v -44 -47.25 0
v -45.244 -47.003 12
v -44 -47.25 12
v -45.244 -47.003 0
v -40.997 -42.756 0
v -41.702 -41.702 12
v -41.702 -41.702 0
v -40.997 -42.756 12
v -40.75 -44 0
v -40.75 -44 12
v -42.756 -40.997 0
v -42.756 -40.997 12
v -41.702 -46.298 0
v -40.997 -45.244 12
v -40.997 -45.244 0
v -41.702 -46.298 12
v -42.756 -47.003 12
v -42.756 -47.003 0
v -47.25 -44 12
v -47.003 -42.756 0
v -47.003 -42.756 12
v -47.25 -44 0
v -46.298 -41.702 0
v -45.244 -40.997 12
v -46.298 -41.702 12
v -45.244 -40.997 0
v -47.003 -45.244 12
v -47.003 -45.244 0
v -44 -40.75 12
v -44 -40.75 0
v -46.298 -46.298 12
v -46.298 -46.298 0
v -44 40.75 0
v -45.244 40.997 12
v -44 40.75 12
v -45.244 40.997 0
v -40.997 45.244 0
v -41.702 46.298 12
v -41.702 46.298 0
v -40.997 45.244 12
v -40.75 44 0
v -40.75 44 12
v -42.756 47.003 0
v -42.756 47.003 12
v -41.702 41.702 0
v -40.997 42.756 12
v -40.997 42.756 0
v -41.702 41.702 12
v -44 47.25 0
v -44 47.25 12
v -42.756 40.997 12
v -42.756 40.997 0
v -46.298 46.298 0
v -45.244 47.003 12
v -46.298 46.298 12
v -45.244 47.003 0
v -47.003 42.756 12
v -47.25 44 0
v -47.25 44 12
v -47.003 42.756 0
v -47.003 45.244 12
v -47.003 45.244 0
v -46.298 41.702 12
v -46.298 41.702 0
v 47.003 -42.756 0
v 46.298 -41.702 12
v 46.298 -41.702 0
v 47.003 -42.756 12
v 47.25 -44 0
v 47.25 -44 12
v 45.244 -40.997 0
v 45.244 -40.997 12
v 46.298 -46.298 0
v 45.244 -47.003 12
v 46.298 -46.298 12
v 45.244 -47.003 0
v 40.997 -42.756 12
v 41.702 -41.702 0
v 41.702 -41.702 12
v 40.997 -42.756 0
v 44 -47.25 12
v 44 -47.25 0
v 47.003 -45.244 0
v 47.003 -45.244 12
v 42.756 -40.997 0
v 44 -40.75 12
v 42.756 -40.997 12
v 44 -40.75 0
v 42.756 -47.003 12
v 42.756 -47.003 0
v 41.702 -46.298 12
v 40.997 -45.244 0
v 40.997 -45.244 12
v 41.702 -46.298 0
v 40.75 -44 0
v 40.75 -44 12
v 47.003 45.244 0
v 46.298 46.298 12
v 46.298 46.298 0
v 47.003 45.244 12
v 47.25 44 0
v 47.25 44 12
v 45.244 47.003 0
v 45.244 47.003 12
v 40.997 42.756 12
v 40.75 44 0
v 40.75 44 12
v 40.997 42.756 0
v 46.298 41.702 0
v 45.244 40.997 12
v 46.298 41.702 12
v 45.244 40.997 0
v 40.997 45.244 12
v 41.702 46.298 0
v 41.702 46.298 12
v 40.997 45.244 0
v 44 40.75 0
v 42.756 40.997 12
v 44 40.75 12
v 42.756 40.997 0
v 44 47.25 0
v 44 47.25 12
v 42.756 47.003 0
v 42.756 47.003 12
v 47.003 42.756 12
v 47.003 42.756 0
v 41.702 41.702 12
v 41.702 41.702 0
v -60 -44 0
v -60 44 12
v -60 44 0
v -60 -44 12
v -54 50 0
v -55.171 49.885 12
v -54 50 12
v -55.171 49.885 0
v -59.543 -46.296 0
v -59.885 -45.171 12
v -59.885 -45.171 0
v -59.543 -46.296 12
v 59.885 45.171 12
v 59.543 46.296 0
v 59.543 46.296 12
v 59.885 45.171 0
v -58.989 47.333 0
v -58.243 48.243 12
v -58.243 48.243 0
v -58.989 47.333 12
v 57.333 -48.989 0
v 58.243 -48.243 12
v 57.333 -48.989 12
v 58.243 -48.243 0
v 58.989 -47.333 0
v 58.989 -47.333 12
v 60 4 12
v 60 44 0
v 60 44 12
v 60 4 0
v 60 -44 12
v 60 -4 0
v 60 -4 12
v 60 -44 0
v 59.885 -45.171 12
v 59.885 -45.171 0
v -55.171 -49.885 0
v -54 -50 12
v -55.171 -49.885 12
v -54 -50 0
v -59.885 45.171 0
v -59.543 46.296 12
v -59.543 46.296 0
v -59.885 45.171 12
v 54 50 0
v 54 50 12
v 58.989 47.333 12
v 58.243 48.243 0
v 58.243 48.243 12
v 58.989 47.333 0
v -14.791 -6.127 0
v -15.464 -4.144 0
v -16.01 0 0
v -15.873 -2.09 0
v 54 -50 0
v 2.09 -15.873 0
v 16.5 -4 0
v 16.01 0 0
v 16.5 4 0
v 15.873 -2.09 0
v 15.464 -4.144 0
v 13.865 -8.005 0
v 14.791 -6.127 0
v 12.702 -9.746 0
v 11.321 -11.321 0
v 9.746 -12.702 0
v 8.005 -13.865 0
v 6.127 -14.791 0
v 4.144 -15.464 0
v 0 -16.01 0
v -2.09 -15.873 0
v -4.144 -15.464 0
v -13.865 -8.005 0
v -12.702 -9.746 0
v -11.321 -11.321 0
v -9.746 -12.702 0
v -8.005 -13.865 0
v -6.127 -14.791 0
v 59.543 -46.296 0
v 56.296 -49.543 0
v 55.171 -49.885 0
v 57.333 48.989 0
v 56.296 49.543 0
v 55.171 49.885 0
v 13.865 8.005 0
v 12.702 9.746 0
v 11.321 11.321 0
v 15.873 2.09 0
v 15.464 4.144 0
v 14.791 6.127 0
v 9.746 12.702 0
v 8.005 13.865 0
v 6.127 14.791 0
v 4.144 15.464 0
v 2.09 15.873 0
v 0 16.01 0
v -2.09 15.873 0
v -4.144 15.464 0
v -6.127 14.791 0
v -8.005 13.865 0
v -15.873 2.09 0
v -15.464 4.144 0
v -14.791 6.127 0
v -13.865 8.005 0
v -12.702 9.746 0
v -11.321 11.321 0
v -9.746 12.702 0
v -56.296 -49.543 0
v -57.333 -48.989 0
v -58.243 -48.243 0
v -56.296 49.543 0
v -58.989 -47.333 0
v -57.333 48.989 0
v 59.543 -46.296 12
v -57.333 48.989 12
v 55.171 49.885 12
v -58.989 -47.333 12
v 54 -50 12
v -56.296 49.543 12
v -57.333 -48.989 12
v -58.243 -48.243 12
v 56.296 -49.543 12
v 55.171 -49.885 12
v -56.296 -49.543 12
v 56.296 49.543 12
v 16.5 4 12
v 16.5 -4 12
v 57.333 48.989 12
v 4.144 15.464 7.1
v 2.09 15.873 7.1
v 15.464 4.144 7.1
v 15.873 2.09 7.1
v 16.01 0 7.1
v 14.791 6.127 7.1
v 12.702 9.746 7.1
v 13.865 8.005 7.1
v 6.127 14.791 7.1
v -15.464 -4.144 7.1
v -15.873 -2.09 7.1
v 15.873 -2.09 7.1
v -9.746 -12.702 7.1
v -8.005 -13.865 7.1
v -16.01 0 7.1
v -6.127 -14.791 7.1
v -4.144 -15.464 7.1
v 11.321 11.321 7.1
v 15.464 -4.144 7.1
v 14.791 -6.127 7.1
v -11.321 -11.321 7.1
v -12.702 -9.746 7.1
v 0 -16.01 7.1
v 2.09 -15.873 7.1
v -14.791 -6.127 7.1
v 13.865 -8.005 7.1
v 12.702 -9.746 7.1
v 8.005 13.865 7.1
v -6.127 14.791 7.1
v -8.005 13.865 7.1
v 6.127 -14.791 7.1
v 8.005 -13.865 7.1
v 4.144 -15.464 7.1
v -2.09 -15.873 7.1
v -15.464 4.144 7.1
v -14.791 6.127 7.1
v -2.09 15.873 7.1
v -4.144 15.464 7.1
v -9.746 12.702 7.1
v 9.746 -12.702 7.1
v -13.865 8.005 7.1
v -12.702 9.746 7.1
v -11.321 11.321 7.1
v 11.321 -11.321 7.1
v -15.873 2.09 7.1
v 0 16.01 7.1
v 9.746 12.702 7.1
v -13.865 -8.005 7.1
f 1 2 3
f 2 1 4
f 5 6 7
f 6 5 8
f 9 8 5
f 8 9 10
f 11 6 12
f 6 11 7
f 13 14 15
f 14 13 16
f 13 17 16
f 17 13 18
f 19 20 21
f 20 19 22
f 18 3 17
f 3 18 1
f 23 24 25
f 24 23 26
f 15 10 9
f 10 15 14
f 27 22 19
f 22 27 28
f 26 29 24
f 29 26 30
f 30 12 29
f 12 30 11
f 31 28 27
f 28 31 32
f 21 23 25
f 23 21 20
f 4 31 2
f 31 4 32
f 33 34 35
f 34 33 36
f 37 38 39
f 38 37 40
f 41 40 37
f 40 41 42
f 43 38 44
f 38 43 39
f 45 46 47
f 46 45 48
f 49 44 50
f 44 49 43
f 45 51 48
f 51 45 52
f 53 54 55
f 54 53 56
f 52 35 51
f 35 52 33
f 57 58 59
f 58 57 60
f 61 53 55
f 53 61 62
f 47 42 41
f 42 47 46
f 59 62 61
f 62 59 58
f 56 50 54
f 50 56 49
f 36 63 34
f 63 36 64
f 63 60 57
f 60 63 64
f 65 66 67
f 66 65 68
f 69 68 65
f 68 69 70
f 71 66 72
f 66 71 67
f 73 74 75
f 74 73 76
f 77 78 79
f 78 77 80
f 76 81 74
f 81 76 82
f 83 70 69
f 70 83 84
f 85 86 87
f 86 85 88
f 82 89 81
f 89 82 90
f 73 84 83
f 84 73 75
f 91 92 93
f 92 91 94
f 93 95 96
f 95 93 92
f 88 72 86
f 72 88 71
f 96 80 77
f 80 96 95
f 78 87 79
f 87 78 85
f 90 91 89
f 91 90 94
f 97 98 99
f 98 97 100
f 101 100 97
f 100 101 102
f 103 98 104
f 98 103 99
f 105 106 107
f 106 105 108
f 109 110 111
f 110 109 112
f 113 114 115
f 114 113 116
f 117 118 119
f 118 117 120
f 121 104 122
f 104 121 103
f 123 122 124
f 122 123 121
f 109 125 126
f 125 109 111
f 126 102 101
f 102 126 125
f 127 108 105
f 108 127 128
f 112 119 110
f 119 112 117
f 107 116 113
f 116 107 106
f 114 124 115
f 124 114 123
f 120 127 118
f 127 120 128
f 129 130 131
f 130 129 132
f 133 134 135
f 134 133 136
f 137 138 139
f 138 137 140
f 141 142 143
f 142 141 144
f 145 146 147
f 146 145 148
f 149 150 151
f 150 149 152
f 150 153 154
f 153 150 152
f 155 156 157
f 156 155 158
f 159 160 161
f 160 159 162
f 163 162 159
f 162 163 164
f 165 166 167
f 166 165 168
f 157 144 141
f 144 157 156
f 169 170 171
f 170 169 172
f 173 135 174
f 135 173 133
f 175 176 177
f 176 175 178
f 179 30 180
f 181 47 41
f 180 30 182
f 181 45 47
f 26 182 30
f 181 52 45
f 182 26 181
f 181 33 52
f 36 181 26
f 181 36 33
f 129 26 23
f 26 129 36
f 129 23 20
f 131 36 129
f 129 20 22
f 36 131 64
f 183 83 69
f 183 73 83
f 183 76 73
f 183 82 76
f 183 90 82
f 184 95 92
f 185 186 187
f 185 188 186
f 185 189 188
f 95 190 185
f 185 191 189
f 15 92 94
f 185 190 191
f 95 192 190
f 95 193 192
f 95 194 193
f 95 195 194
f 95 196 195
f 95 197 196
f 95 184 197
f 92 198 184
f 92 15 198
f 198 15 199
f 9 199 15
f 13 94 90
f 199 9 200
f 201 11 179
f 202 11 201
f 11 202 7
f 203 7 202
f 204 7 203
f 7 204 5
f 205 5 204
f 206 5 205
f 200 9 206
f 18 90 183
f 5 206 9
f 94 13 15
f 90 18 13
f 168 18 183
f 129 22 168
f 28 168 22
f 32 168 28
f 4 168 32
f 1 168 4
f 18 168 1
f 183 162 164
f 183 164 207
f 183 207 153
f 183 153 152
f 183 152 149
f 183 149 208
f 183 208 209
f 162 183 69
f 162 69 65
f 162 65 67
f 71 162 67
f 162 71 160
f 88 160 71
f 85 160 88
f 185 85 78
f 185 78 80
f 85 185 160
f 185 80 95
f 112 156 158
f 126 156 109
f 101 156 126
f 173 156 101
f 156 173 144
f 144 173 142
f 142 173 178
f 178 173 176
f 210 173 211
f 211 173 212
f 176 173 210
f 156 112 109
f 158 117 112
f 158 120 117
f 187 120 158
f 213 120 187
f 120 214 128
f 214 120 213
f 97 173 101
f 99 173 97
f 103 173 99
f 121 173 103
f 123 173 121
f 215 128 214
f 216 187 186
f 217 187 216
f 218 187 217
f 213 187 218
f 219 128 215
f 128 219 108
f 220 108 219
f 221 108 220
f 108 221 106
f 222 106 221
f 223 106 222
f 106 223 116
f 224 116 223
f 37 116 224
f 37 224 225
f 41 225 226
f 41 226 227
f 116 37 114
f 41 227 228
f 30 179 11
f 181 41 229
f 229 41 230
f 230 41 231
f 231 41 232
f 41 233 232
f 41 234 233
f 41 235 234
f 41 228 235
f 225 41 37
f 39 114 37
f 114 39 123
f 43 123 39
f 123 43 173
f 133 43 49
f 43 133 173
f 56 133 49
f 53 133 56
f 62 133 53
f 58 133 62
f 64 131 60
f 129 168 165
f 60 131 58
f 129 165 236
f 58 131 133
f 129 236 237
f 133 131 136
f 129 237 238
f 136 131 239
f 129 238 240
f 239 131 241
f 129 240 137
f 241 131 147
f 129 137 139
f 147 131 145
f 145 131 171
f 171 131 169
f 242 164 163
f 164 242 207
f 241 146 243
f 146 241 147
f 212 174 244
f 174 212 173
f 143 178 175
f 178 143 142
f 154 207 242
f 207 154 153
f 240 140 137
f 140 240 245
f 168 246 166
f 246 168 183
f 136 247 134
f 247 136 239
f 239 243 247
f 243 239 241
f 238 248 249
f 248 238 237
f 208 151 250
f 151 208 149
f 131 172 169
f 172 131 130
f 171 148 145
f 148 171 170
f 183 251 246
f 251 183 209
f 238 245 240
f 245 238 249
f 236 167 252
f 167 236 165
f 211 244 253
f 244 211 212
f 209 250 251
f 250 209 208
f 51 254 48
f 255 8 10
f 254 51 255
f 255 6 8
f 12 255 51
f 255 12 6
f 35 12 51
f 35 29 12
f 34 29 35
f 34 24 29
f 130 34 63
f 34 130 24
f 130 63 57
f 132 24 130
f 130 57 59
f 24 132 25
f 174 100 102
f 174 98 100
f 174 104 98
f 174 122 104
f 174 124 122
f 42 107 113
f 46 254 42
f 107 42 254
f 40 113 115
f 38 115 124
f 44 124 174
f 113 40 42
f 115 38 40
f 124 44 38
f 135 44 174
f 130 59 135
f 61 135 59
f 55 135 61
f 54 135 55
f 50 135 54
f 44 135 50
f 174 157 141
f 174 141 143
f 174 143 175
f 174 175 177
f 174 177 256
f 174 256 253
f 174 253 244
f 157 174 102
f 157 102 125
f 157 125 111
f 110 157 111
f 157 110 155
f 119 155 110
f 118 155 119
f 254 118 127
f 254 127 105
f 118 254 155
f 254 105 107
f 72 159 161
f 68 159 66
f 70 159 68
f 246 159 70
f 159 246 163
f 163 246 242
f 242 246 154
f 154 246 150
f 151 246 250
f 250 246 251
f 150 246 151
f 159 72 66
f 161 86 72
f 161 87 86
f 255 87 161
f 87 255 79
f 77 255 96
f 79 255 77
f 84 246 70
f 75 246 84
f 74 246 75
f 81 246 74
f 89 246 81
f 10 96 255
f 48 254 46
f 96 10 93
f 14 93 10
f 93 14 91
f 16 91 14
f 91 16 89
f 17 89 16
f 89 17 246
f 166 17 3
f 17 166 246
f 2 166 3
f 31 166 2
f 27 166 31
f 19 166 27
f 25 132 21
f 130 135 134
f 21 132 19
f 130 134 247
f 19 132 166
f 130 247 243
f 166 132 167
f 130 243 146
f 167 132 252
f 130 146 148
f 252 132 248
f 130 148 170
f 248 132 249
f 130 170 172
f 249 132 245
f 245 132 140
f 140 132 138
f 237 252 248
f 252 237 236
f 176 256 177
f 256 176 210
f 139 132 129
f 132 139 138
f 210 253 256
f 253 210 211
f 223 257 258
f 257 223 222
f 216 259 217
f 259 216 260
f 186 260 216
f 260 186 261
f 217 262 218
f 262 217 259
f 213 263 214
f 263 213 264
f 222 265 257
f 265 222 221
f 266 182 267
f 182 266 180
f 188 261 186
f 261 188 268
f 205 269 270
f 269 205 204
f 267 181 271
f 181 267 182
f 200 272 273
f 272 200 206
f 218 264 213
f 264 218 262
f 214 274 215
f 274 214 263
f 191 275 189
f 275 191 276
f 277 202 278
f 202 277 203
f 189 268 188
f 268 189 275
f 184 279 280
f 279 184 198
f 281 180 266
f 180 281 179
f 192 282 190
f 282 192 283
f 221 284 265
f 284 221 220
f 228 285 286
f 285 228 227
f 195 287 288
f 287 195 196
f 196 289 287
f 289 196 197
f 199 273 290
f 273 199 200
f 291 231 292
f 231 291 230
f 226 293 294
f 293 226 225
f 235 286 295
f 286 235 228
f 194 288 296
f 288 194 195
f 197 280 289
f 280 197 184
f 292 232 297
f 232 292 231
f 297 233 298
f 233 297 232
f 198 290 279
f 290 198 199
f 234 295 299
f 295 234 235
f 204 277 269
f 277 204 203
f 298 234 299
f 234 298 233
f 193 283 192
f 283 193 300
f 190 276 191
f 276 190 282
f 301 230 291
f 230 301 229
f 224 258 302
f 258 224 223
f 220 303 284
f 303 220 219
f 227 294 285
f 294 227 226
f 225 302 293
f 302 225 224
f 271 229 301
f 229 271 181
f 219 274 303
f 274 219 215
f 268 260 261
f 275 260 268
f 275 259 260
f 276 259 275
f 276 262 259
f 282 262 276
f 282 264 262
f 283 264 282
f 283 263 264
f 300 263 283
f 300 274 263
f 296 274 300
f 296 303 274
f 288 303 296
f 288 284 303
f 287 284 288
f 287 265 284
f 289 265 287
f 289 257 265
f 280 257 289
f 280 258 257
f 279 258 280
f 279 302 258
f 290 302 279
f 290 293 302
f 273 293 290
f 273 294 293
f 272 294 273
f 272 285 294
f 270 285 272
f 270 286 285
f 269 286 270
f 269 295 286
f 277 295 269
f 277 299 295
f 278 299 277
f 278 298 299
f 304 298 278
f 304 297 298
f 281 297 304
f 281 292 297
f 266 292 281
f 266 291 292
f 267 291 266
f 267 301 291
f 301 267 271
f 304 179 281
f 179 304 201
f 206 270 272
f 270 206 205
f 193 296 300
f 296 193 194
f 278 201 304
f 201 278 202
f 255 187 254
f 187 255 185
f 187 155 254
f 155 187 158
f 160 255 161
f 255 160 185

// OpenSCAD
// ===========================================================================
// HULL-FRAME COORDINATE STANDARD - Rev R1 (2026-06-11).  See CLAUDE.md.
//   Hull frame (canonical for ALL design artifacts): X = +port (left),
//   Y = +aft (back), Z = +dorsal (up); origin = SerenityAssembly.FCStd
//   world origin.  Primary-component STLs published to airframe/stls/
//   are stored directly in hull frame, baked by tools/bake_hull_frame.py
//   (marker 'SerenityUAV HULL-FRAME R1' in the binary STL header).
//   NEVER re-bake a mesh derived from an already-baked file.
//   This file:
//     Malcolm ground-support equipment - part-local print frame.  The
//     aircraft hull-frame standard does not apply to GCS hardware
//     (documented exception, like the avionics KiCad files).
// ===========================================================================
/*
 * malcolm_gimbal_pan.scad
 * Pan (azimuth) stage for Malcolm GCS directional antenna gimbal
 *
 * Author:  Steve Griffing, PE(CSE), CISSP-ISSEP, CPP
 * License: CC BY 4.0 — creativecommons.org/licenses/by/4.0
 * Revision: R (2026-06-11)
 *
 * Description:
 *   The pan stage rotates the tilt stage + antenna assembly about the vertical
 *   (Z) axis.  It consists of:
 *     - Base plate that mounts to the tripod or mast (M6 bolt pattern)
 *     - 6804 (20×32×7 mm) thin-section bearing pressed into base
 *     - Rotating turret that carries the tilt stage
 *     - DS3218MG servo mounted in the base, driving the turret via a printed
 *       sector gear attached to the turret underside
 *     - AS5600 magnetic encoder PCB pocket on the underside of the turret
 *       (reads the diametrically magnetised disc pressed onto the bearing shaft)
 *     - Travel limits: 0°–355° continuous (5° hard stop gap for wiring relief)
 *
 * Material: CF-PETG, 0.15 mm layers, 40% infill, 4 perimeters
 *
 * Mesh verification: run after every geometry change.
 *   openscad -o malcolm_gimbal_pan.stl malcolm_gimbal_pan.scad
 *   python3 tools/validate_stls.py
 */

/* ---------------------------------------------------------------------------
 * Render mode: 0 = base plate, 1 = rotating turret, 2 = exploded assembly
 * ---------------------------------------------------------------------------*/
RENDER_MODE = 0;

/* ---------------------------------------------------------------------------
 * Bearing (6804 thin-section: 20 mm ID, 32 mm OD, 7 mm width)
 * ---------------------------------------------------------------------------*/
BRG_ID   = 20.0;   /* Inner race bore mm                                  */
BRG_OD   = 32.0;   /* Outer race diameter mm                              */
BRG_W    = 7.0;    /* Bearing width mm                                    */
BRG_PRESS_TOL = 0.02; /* Press-fit interference on housing bore (+ = tighter) */

/* ---------------------------------------------------------------------------
 * Base plate geometry
 * ---------------------------------------------------------------------------*/
BASE_W   = 120.0;  /* Base plate width mm                                  */
BASE_D   = 100.0;  /* Base plate depth mm                                  */
BASE_H   = 12.0;   /* Base plate thickness mm (including bearing housing)  */
BASE_R   = 6.0;    /* Corner radius mm                                     */
MOUNT_HOLE_D = 6.5;/* M6 tripod mount hole diameter mm                    */
MOUNT_PITCH  = 88.0;/* M6 mounting hole pitch (centre-to-centre) mm       */

/* ---------------------------------------------------------------------------
 * Servo pocket (DS3218MG: 40×20×38 mm body; shaft centre at 20×10 mm from
 * mounting face)
 * ---------------------------------------------------------------------------*/
SERVO_W      = 42.0;   /* Pocket width mm (2 mm clearance each side)      */
SERVO_D      = 22.0;   /* Pocket depth mm                                  */
SERVO_H      = 40.0;   /* Pocket depth below base top face mm              */
SERVO_OFFSET_X = 30.0; /* Servo shaft centre offset from bearing centre X mm */

/* ---------------------------------------------------------------------------
 * Sector gear on turret (M=1.0, R=28 mm, 120° arc driven by servo arm pinion)
 * ---------------------------------------------------------------------------*/
SECTOR_R    = 28.0; /* Pitch radius mm                                     */
SECTOR_ARC  = 120;  /* Sweep angle deg — servo ±60° gives 120° pan range  */
SECTOR_W    = 8.0;  /* Gear face width mm                                  */

/* ---------------------------------------------------------------------------
 * Turret geometry
 * ---------------------------------------------------------------------------*/
TURRET_OD   = 80.0; /* Turret outer diameter mm                            */
TURRET_H    = 15.0; /* Turret body height mm                               */
TILT_MOUNT_W = 60.0;/* Width of tilt stage mounting boss on turret top mm  */
TILT_MOUNT_D = 40.0;/* Depth of tilt stage mounting boss mm                */
TILT_MOUNT_H = 6.0; /* Boss protrusion height mm                           */

/* ===========================================================================
 * Modules
 * ===========================================================================*/

module base_plate() {
    /*
     * Base plate with:
     *   - Central bearing housing (outer race press-fit bore)
     *   - Servo pocket
     *   - M6 tripod mounting holes at four corners
     *   - M3 mounting holes for AS5600 encoder PCB on underside
     */
    difference() {
        /* Exterior solid */
        hull() {
            for (xi = [-1, 1]) {
                for (yi = [-1, 1]) {
                    translate([xi * (BASE_W / 2 - BASE_R), yi * (BASE_D / 2 - BASE_R), 0]) {
                        cylinder(r = BASE_R, h = BASE_H, $fn = 32);
                    }
                }
            }
        }

        /* Central bearing housing bore (outer race press-fit) */
        translate([0, 0, -0.1]) {
            cylinder(d = BRG_OD + BRG_PRESS_TOL, h = BRG_W + 0.2, $fn = 48);
        }

        /* Servo pocket */
        translate([SERVO_OFFSET_X, 0, BASE_H - SERVO_H]) {
            cube([SERVO_W, SERVO_D, SERVO_H + 0.1], center = true);
        }

        /* M6 tripod mount holes */
        for (xi = [-1, 1]) {
            for (yi = [-1, 1]) {
                translate([xi * MOUNT_PITCH / 2, yi * MOUNT_PITCH / 2, -0.1]) {
                    cylinder(d = MOUNT_HOLE_D, h = BASE_H + 0.2, $fn = 16);
                }
            }
        }

        /* Wire relief slot from servo pocket to exterior */
        translate([SERVO_OFFSET_X + SERVO_W / 2, 0, BASE_H / 2]) {
            cube([BASE_W - SERVO_OFFSET_X - SERVO_W / 2, 8, BASE_H + 0.2], center = true);
        }
    }
}

module turret() {
    /*
     * Rotating turret: mounts to bearing inner race, carries tilt stage boss
     * on top face, and has sector gear on underside for pan drive.
     */
    difference() {
        union() {
            /* Main disc */
            cylinder(d = TURRET_OD, h = TURRET_H, $fn = 64);

            /* Tilt stage mounting boss on top */
            translate([0, 0, TURRET_H]) {
                cube([TILT_MOUNT_W, TILT_MOUNT_D, TILT_MOUNT_H], center = true);
            }
        }

        /* Bearing inner race bore — slip fit onto shaft */
        translate([0, 0, -0.1]) {
            cylinder(d = BRG_ID + 0.1, h = BRG_W + TURRET_H + 0.2, $fn = 32);
        }

        /* M3 holes for tilt stage attachment — 4× at tilt mount boss corners */
        for (xi = [-1, 1]) {
            for (yi = [-1, 1]) {
                translate([xi * (TILT_MOUNT_W / 2 - 5), yi * (TILT_MOUNT_D / 2 - 5),
                           TURRET_H - 0.1]) {
                    cylinder(d = 3.2, h = TILT_MOUNT_H + 0.2, $fn = 12);
                }
            }
        }
    }
}

/* ===========================================================================
 * Render dispatch
 * ===========================================================================*/
if (RENDER_MODE == 0) {
    base_plate();
} else if (RENDER_MODE == 1) {
    turret();
} else {
    /* Exploded view: base at origin, turret above */
    base_plate();
    translate([0, 0, BASE_H + 20]) {
        turret();
    }
}
